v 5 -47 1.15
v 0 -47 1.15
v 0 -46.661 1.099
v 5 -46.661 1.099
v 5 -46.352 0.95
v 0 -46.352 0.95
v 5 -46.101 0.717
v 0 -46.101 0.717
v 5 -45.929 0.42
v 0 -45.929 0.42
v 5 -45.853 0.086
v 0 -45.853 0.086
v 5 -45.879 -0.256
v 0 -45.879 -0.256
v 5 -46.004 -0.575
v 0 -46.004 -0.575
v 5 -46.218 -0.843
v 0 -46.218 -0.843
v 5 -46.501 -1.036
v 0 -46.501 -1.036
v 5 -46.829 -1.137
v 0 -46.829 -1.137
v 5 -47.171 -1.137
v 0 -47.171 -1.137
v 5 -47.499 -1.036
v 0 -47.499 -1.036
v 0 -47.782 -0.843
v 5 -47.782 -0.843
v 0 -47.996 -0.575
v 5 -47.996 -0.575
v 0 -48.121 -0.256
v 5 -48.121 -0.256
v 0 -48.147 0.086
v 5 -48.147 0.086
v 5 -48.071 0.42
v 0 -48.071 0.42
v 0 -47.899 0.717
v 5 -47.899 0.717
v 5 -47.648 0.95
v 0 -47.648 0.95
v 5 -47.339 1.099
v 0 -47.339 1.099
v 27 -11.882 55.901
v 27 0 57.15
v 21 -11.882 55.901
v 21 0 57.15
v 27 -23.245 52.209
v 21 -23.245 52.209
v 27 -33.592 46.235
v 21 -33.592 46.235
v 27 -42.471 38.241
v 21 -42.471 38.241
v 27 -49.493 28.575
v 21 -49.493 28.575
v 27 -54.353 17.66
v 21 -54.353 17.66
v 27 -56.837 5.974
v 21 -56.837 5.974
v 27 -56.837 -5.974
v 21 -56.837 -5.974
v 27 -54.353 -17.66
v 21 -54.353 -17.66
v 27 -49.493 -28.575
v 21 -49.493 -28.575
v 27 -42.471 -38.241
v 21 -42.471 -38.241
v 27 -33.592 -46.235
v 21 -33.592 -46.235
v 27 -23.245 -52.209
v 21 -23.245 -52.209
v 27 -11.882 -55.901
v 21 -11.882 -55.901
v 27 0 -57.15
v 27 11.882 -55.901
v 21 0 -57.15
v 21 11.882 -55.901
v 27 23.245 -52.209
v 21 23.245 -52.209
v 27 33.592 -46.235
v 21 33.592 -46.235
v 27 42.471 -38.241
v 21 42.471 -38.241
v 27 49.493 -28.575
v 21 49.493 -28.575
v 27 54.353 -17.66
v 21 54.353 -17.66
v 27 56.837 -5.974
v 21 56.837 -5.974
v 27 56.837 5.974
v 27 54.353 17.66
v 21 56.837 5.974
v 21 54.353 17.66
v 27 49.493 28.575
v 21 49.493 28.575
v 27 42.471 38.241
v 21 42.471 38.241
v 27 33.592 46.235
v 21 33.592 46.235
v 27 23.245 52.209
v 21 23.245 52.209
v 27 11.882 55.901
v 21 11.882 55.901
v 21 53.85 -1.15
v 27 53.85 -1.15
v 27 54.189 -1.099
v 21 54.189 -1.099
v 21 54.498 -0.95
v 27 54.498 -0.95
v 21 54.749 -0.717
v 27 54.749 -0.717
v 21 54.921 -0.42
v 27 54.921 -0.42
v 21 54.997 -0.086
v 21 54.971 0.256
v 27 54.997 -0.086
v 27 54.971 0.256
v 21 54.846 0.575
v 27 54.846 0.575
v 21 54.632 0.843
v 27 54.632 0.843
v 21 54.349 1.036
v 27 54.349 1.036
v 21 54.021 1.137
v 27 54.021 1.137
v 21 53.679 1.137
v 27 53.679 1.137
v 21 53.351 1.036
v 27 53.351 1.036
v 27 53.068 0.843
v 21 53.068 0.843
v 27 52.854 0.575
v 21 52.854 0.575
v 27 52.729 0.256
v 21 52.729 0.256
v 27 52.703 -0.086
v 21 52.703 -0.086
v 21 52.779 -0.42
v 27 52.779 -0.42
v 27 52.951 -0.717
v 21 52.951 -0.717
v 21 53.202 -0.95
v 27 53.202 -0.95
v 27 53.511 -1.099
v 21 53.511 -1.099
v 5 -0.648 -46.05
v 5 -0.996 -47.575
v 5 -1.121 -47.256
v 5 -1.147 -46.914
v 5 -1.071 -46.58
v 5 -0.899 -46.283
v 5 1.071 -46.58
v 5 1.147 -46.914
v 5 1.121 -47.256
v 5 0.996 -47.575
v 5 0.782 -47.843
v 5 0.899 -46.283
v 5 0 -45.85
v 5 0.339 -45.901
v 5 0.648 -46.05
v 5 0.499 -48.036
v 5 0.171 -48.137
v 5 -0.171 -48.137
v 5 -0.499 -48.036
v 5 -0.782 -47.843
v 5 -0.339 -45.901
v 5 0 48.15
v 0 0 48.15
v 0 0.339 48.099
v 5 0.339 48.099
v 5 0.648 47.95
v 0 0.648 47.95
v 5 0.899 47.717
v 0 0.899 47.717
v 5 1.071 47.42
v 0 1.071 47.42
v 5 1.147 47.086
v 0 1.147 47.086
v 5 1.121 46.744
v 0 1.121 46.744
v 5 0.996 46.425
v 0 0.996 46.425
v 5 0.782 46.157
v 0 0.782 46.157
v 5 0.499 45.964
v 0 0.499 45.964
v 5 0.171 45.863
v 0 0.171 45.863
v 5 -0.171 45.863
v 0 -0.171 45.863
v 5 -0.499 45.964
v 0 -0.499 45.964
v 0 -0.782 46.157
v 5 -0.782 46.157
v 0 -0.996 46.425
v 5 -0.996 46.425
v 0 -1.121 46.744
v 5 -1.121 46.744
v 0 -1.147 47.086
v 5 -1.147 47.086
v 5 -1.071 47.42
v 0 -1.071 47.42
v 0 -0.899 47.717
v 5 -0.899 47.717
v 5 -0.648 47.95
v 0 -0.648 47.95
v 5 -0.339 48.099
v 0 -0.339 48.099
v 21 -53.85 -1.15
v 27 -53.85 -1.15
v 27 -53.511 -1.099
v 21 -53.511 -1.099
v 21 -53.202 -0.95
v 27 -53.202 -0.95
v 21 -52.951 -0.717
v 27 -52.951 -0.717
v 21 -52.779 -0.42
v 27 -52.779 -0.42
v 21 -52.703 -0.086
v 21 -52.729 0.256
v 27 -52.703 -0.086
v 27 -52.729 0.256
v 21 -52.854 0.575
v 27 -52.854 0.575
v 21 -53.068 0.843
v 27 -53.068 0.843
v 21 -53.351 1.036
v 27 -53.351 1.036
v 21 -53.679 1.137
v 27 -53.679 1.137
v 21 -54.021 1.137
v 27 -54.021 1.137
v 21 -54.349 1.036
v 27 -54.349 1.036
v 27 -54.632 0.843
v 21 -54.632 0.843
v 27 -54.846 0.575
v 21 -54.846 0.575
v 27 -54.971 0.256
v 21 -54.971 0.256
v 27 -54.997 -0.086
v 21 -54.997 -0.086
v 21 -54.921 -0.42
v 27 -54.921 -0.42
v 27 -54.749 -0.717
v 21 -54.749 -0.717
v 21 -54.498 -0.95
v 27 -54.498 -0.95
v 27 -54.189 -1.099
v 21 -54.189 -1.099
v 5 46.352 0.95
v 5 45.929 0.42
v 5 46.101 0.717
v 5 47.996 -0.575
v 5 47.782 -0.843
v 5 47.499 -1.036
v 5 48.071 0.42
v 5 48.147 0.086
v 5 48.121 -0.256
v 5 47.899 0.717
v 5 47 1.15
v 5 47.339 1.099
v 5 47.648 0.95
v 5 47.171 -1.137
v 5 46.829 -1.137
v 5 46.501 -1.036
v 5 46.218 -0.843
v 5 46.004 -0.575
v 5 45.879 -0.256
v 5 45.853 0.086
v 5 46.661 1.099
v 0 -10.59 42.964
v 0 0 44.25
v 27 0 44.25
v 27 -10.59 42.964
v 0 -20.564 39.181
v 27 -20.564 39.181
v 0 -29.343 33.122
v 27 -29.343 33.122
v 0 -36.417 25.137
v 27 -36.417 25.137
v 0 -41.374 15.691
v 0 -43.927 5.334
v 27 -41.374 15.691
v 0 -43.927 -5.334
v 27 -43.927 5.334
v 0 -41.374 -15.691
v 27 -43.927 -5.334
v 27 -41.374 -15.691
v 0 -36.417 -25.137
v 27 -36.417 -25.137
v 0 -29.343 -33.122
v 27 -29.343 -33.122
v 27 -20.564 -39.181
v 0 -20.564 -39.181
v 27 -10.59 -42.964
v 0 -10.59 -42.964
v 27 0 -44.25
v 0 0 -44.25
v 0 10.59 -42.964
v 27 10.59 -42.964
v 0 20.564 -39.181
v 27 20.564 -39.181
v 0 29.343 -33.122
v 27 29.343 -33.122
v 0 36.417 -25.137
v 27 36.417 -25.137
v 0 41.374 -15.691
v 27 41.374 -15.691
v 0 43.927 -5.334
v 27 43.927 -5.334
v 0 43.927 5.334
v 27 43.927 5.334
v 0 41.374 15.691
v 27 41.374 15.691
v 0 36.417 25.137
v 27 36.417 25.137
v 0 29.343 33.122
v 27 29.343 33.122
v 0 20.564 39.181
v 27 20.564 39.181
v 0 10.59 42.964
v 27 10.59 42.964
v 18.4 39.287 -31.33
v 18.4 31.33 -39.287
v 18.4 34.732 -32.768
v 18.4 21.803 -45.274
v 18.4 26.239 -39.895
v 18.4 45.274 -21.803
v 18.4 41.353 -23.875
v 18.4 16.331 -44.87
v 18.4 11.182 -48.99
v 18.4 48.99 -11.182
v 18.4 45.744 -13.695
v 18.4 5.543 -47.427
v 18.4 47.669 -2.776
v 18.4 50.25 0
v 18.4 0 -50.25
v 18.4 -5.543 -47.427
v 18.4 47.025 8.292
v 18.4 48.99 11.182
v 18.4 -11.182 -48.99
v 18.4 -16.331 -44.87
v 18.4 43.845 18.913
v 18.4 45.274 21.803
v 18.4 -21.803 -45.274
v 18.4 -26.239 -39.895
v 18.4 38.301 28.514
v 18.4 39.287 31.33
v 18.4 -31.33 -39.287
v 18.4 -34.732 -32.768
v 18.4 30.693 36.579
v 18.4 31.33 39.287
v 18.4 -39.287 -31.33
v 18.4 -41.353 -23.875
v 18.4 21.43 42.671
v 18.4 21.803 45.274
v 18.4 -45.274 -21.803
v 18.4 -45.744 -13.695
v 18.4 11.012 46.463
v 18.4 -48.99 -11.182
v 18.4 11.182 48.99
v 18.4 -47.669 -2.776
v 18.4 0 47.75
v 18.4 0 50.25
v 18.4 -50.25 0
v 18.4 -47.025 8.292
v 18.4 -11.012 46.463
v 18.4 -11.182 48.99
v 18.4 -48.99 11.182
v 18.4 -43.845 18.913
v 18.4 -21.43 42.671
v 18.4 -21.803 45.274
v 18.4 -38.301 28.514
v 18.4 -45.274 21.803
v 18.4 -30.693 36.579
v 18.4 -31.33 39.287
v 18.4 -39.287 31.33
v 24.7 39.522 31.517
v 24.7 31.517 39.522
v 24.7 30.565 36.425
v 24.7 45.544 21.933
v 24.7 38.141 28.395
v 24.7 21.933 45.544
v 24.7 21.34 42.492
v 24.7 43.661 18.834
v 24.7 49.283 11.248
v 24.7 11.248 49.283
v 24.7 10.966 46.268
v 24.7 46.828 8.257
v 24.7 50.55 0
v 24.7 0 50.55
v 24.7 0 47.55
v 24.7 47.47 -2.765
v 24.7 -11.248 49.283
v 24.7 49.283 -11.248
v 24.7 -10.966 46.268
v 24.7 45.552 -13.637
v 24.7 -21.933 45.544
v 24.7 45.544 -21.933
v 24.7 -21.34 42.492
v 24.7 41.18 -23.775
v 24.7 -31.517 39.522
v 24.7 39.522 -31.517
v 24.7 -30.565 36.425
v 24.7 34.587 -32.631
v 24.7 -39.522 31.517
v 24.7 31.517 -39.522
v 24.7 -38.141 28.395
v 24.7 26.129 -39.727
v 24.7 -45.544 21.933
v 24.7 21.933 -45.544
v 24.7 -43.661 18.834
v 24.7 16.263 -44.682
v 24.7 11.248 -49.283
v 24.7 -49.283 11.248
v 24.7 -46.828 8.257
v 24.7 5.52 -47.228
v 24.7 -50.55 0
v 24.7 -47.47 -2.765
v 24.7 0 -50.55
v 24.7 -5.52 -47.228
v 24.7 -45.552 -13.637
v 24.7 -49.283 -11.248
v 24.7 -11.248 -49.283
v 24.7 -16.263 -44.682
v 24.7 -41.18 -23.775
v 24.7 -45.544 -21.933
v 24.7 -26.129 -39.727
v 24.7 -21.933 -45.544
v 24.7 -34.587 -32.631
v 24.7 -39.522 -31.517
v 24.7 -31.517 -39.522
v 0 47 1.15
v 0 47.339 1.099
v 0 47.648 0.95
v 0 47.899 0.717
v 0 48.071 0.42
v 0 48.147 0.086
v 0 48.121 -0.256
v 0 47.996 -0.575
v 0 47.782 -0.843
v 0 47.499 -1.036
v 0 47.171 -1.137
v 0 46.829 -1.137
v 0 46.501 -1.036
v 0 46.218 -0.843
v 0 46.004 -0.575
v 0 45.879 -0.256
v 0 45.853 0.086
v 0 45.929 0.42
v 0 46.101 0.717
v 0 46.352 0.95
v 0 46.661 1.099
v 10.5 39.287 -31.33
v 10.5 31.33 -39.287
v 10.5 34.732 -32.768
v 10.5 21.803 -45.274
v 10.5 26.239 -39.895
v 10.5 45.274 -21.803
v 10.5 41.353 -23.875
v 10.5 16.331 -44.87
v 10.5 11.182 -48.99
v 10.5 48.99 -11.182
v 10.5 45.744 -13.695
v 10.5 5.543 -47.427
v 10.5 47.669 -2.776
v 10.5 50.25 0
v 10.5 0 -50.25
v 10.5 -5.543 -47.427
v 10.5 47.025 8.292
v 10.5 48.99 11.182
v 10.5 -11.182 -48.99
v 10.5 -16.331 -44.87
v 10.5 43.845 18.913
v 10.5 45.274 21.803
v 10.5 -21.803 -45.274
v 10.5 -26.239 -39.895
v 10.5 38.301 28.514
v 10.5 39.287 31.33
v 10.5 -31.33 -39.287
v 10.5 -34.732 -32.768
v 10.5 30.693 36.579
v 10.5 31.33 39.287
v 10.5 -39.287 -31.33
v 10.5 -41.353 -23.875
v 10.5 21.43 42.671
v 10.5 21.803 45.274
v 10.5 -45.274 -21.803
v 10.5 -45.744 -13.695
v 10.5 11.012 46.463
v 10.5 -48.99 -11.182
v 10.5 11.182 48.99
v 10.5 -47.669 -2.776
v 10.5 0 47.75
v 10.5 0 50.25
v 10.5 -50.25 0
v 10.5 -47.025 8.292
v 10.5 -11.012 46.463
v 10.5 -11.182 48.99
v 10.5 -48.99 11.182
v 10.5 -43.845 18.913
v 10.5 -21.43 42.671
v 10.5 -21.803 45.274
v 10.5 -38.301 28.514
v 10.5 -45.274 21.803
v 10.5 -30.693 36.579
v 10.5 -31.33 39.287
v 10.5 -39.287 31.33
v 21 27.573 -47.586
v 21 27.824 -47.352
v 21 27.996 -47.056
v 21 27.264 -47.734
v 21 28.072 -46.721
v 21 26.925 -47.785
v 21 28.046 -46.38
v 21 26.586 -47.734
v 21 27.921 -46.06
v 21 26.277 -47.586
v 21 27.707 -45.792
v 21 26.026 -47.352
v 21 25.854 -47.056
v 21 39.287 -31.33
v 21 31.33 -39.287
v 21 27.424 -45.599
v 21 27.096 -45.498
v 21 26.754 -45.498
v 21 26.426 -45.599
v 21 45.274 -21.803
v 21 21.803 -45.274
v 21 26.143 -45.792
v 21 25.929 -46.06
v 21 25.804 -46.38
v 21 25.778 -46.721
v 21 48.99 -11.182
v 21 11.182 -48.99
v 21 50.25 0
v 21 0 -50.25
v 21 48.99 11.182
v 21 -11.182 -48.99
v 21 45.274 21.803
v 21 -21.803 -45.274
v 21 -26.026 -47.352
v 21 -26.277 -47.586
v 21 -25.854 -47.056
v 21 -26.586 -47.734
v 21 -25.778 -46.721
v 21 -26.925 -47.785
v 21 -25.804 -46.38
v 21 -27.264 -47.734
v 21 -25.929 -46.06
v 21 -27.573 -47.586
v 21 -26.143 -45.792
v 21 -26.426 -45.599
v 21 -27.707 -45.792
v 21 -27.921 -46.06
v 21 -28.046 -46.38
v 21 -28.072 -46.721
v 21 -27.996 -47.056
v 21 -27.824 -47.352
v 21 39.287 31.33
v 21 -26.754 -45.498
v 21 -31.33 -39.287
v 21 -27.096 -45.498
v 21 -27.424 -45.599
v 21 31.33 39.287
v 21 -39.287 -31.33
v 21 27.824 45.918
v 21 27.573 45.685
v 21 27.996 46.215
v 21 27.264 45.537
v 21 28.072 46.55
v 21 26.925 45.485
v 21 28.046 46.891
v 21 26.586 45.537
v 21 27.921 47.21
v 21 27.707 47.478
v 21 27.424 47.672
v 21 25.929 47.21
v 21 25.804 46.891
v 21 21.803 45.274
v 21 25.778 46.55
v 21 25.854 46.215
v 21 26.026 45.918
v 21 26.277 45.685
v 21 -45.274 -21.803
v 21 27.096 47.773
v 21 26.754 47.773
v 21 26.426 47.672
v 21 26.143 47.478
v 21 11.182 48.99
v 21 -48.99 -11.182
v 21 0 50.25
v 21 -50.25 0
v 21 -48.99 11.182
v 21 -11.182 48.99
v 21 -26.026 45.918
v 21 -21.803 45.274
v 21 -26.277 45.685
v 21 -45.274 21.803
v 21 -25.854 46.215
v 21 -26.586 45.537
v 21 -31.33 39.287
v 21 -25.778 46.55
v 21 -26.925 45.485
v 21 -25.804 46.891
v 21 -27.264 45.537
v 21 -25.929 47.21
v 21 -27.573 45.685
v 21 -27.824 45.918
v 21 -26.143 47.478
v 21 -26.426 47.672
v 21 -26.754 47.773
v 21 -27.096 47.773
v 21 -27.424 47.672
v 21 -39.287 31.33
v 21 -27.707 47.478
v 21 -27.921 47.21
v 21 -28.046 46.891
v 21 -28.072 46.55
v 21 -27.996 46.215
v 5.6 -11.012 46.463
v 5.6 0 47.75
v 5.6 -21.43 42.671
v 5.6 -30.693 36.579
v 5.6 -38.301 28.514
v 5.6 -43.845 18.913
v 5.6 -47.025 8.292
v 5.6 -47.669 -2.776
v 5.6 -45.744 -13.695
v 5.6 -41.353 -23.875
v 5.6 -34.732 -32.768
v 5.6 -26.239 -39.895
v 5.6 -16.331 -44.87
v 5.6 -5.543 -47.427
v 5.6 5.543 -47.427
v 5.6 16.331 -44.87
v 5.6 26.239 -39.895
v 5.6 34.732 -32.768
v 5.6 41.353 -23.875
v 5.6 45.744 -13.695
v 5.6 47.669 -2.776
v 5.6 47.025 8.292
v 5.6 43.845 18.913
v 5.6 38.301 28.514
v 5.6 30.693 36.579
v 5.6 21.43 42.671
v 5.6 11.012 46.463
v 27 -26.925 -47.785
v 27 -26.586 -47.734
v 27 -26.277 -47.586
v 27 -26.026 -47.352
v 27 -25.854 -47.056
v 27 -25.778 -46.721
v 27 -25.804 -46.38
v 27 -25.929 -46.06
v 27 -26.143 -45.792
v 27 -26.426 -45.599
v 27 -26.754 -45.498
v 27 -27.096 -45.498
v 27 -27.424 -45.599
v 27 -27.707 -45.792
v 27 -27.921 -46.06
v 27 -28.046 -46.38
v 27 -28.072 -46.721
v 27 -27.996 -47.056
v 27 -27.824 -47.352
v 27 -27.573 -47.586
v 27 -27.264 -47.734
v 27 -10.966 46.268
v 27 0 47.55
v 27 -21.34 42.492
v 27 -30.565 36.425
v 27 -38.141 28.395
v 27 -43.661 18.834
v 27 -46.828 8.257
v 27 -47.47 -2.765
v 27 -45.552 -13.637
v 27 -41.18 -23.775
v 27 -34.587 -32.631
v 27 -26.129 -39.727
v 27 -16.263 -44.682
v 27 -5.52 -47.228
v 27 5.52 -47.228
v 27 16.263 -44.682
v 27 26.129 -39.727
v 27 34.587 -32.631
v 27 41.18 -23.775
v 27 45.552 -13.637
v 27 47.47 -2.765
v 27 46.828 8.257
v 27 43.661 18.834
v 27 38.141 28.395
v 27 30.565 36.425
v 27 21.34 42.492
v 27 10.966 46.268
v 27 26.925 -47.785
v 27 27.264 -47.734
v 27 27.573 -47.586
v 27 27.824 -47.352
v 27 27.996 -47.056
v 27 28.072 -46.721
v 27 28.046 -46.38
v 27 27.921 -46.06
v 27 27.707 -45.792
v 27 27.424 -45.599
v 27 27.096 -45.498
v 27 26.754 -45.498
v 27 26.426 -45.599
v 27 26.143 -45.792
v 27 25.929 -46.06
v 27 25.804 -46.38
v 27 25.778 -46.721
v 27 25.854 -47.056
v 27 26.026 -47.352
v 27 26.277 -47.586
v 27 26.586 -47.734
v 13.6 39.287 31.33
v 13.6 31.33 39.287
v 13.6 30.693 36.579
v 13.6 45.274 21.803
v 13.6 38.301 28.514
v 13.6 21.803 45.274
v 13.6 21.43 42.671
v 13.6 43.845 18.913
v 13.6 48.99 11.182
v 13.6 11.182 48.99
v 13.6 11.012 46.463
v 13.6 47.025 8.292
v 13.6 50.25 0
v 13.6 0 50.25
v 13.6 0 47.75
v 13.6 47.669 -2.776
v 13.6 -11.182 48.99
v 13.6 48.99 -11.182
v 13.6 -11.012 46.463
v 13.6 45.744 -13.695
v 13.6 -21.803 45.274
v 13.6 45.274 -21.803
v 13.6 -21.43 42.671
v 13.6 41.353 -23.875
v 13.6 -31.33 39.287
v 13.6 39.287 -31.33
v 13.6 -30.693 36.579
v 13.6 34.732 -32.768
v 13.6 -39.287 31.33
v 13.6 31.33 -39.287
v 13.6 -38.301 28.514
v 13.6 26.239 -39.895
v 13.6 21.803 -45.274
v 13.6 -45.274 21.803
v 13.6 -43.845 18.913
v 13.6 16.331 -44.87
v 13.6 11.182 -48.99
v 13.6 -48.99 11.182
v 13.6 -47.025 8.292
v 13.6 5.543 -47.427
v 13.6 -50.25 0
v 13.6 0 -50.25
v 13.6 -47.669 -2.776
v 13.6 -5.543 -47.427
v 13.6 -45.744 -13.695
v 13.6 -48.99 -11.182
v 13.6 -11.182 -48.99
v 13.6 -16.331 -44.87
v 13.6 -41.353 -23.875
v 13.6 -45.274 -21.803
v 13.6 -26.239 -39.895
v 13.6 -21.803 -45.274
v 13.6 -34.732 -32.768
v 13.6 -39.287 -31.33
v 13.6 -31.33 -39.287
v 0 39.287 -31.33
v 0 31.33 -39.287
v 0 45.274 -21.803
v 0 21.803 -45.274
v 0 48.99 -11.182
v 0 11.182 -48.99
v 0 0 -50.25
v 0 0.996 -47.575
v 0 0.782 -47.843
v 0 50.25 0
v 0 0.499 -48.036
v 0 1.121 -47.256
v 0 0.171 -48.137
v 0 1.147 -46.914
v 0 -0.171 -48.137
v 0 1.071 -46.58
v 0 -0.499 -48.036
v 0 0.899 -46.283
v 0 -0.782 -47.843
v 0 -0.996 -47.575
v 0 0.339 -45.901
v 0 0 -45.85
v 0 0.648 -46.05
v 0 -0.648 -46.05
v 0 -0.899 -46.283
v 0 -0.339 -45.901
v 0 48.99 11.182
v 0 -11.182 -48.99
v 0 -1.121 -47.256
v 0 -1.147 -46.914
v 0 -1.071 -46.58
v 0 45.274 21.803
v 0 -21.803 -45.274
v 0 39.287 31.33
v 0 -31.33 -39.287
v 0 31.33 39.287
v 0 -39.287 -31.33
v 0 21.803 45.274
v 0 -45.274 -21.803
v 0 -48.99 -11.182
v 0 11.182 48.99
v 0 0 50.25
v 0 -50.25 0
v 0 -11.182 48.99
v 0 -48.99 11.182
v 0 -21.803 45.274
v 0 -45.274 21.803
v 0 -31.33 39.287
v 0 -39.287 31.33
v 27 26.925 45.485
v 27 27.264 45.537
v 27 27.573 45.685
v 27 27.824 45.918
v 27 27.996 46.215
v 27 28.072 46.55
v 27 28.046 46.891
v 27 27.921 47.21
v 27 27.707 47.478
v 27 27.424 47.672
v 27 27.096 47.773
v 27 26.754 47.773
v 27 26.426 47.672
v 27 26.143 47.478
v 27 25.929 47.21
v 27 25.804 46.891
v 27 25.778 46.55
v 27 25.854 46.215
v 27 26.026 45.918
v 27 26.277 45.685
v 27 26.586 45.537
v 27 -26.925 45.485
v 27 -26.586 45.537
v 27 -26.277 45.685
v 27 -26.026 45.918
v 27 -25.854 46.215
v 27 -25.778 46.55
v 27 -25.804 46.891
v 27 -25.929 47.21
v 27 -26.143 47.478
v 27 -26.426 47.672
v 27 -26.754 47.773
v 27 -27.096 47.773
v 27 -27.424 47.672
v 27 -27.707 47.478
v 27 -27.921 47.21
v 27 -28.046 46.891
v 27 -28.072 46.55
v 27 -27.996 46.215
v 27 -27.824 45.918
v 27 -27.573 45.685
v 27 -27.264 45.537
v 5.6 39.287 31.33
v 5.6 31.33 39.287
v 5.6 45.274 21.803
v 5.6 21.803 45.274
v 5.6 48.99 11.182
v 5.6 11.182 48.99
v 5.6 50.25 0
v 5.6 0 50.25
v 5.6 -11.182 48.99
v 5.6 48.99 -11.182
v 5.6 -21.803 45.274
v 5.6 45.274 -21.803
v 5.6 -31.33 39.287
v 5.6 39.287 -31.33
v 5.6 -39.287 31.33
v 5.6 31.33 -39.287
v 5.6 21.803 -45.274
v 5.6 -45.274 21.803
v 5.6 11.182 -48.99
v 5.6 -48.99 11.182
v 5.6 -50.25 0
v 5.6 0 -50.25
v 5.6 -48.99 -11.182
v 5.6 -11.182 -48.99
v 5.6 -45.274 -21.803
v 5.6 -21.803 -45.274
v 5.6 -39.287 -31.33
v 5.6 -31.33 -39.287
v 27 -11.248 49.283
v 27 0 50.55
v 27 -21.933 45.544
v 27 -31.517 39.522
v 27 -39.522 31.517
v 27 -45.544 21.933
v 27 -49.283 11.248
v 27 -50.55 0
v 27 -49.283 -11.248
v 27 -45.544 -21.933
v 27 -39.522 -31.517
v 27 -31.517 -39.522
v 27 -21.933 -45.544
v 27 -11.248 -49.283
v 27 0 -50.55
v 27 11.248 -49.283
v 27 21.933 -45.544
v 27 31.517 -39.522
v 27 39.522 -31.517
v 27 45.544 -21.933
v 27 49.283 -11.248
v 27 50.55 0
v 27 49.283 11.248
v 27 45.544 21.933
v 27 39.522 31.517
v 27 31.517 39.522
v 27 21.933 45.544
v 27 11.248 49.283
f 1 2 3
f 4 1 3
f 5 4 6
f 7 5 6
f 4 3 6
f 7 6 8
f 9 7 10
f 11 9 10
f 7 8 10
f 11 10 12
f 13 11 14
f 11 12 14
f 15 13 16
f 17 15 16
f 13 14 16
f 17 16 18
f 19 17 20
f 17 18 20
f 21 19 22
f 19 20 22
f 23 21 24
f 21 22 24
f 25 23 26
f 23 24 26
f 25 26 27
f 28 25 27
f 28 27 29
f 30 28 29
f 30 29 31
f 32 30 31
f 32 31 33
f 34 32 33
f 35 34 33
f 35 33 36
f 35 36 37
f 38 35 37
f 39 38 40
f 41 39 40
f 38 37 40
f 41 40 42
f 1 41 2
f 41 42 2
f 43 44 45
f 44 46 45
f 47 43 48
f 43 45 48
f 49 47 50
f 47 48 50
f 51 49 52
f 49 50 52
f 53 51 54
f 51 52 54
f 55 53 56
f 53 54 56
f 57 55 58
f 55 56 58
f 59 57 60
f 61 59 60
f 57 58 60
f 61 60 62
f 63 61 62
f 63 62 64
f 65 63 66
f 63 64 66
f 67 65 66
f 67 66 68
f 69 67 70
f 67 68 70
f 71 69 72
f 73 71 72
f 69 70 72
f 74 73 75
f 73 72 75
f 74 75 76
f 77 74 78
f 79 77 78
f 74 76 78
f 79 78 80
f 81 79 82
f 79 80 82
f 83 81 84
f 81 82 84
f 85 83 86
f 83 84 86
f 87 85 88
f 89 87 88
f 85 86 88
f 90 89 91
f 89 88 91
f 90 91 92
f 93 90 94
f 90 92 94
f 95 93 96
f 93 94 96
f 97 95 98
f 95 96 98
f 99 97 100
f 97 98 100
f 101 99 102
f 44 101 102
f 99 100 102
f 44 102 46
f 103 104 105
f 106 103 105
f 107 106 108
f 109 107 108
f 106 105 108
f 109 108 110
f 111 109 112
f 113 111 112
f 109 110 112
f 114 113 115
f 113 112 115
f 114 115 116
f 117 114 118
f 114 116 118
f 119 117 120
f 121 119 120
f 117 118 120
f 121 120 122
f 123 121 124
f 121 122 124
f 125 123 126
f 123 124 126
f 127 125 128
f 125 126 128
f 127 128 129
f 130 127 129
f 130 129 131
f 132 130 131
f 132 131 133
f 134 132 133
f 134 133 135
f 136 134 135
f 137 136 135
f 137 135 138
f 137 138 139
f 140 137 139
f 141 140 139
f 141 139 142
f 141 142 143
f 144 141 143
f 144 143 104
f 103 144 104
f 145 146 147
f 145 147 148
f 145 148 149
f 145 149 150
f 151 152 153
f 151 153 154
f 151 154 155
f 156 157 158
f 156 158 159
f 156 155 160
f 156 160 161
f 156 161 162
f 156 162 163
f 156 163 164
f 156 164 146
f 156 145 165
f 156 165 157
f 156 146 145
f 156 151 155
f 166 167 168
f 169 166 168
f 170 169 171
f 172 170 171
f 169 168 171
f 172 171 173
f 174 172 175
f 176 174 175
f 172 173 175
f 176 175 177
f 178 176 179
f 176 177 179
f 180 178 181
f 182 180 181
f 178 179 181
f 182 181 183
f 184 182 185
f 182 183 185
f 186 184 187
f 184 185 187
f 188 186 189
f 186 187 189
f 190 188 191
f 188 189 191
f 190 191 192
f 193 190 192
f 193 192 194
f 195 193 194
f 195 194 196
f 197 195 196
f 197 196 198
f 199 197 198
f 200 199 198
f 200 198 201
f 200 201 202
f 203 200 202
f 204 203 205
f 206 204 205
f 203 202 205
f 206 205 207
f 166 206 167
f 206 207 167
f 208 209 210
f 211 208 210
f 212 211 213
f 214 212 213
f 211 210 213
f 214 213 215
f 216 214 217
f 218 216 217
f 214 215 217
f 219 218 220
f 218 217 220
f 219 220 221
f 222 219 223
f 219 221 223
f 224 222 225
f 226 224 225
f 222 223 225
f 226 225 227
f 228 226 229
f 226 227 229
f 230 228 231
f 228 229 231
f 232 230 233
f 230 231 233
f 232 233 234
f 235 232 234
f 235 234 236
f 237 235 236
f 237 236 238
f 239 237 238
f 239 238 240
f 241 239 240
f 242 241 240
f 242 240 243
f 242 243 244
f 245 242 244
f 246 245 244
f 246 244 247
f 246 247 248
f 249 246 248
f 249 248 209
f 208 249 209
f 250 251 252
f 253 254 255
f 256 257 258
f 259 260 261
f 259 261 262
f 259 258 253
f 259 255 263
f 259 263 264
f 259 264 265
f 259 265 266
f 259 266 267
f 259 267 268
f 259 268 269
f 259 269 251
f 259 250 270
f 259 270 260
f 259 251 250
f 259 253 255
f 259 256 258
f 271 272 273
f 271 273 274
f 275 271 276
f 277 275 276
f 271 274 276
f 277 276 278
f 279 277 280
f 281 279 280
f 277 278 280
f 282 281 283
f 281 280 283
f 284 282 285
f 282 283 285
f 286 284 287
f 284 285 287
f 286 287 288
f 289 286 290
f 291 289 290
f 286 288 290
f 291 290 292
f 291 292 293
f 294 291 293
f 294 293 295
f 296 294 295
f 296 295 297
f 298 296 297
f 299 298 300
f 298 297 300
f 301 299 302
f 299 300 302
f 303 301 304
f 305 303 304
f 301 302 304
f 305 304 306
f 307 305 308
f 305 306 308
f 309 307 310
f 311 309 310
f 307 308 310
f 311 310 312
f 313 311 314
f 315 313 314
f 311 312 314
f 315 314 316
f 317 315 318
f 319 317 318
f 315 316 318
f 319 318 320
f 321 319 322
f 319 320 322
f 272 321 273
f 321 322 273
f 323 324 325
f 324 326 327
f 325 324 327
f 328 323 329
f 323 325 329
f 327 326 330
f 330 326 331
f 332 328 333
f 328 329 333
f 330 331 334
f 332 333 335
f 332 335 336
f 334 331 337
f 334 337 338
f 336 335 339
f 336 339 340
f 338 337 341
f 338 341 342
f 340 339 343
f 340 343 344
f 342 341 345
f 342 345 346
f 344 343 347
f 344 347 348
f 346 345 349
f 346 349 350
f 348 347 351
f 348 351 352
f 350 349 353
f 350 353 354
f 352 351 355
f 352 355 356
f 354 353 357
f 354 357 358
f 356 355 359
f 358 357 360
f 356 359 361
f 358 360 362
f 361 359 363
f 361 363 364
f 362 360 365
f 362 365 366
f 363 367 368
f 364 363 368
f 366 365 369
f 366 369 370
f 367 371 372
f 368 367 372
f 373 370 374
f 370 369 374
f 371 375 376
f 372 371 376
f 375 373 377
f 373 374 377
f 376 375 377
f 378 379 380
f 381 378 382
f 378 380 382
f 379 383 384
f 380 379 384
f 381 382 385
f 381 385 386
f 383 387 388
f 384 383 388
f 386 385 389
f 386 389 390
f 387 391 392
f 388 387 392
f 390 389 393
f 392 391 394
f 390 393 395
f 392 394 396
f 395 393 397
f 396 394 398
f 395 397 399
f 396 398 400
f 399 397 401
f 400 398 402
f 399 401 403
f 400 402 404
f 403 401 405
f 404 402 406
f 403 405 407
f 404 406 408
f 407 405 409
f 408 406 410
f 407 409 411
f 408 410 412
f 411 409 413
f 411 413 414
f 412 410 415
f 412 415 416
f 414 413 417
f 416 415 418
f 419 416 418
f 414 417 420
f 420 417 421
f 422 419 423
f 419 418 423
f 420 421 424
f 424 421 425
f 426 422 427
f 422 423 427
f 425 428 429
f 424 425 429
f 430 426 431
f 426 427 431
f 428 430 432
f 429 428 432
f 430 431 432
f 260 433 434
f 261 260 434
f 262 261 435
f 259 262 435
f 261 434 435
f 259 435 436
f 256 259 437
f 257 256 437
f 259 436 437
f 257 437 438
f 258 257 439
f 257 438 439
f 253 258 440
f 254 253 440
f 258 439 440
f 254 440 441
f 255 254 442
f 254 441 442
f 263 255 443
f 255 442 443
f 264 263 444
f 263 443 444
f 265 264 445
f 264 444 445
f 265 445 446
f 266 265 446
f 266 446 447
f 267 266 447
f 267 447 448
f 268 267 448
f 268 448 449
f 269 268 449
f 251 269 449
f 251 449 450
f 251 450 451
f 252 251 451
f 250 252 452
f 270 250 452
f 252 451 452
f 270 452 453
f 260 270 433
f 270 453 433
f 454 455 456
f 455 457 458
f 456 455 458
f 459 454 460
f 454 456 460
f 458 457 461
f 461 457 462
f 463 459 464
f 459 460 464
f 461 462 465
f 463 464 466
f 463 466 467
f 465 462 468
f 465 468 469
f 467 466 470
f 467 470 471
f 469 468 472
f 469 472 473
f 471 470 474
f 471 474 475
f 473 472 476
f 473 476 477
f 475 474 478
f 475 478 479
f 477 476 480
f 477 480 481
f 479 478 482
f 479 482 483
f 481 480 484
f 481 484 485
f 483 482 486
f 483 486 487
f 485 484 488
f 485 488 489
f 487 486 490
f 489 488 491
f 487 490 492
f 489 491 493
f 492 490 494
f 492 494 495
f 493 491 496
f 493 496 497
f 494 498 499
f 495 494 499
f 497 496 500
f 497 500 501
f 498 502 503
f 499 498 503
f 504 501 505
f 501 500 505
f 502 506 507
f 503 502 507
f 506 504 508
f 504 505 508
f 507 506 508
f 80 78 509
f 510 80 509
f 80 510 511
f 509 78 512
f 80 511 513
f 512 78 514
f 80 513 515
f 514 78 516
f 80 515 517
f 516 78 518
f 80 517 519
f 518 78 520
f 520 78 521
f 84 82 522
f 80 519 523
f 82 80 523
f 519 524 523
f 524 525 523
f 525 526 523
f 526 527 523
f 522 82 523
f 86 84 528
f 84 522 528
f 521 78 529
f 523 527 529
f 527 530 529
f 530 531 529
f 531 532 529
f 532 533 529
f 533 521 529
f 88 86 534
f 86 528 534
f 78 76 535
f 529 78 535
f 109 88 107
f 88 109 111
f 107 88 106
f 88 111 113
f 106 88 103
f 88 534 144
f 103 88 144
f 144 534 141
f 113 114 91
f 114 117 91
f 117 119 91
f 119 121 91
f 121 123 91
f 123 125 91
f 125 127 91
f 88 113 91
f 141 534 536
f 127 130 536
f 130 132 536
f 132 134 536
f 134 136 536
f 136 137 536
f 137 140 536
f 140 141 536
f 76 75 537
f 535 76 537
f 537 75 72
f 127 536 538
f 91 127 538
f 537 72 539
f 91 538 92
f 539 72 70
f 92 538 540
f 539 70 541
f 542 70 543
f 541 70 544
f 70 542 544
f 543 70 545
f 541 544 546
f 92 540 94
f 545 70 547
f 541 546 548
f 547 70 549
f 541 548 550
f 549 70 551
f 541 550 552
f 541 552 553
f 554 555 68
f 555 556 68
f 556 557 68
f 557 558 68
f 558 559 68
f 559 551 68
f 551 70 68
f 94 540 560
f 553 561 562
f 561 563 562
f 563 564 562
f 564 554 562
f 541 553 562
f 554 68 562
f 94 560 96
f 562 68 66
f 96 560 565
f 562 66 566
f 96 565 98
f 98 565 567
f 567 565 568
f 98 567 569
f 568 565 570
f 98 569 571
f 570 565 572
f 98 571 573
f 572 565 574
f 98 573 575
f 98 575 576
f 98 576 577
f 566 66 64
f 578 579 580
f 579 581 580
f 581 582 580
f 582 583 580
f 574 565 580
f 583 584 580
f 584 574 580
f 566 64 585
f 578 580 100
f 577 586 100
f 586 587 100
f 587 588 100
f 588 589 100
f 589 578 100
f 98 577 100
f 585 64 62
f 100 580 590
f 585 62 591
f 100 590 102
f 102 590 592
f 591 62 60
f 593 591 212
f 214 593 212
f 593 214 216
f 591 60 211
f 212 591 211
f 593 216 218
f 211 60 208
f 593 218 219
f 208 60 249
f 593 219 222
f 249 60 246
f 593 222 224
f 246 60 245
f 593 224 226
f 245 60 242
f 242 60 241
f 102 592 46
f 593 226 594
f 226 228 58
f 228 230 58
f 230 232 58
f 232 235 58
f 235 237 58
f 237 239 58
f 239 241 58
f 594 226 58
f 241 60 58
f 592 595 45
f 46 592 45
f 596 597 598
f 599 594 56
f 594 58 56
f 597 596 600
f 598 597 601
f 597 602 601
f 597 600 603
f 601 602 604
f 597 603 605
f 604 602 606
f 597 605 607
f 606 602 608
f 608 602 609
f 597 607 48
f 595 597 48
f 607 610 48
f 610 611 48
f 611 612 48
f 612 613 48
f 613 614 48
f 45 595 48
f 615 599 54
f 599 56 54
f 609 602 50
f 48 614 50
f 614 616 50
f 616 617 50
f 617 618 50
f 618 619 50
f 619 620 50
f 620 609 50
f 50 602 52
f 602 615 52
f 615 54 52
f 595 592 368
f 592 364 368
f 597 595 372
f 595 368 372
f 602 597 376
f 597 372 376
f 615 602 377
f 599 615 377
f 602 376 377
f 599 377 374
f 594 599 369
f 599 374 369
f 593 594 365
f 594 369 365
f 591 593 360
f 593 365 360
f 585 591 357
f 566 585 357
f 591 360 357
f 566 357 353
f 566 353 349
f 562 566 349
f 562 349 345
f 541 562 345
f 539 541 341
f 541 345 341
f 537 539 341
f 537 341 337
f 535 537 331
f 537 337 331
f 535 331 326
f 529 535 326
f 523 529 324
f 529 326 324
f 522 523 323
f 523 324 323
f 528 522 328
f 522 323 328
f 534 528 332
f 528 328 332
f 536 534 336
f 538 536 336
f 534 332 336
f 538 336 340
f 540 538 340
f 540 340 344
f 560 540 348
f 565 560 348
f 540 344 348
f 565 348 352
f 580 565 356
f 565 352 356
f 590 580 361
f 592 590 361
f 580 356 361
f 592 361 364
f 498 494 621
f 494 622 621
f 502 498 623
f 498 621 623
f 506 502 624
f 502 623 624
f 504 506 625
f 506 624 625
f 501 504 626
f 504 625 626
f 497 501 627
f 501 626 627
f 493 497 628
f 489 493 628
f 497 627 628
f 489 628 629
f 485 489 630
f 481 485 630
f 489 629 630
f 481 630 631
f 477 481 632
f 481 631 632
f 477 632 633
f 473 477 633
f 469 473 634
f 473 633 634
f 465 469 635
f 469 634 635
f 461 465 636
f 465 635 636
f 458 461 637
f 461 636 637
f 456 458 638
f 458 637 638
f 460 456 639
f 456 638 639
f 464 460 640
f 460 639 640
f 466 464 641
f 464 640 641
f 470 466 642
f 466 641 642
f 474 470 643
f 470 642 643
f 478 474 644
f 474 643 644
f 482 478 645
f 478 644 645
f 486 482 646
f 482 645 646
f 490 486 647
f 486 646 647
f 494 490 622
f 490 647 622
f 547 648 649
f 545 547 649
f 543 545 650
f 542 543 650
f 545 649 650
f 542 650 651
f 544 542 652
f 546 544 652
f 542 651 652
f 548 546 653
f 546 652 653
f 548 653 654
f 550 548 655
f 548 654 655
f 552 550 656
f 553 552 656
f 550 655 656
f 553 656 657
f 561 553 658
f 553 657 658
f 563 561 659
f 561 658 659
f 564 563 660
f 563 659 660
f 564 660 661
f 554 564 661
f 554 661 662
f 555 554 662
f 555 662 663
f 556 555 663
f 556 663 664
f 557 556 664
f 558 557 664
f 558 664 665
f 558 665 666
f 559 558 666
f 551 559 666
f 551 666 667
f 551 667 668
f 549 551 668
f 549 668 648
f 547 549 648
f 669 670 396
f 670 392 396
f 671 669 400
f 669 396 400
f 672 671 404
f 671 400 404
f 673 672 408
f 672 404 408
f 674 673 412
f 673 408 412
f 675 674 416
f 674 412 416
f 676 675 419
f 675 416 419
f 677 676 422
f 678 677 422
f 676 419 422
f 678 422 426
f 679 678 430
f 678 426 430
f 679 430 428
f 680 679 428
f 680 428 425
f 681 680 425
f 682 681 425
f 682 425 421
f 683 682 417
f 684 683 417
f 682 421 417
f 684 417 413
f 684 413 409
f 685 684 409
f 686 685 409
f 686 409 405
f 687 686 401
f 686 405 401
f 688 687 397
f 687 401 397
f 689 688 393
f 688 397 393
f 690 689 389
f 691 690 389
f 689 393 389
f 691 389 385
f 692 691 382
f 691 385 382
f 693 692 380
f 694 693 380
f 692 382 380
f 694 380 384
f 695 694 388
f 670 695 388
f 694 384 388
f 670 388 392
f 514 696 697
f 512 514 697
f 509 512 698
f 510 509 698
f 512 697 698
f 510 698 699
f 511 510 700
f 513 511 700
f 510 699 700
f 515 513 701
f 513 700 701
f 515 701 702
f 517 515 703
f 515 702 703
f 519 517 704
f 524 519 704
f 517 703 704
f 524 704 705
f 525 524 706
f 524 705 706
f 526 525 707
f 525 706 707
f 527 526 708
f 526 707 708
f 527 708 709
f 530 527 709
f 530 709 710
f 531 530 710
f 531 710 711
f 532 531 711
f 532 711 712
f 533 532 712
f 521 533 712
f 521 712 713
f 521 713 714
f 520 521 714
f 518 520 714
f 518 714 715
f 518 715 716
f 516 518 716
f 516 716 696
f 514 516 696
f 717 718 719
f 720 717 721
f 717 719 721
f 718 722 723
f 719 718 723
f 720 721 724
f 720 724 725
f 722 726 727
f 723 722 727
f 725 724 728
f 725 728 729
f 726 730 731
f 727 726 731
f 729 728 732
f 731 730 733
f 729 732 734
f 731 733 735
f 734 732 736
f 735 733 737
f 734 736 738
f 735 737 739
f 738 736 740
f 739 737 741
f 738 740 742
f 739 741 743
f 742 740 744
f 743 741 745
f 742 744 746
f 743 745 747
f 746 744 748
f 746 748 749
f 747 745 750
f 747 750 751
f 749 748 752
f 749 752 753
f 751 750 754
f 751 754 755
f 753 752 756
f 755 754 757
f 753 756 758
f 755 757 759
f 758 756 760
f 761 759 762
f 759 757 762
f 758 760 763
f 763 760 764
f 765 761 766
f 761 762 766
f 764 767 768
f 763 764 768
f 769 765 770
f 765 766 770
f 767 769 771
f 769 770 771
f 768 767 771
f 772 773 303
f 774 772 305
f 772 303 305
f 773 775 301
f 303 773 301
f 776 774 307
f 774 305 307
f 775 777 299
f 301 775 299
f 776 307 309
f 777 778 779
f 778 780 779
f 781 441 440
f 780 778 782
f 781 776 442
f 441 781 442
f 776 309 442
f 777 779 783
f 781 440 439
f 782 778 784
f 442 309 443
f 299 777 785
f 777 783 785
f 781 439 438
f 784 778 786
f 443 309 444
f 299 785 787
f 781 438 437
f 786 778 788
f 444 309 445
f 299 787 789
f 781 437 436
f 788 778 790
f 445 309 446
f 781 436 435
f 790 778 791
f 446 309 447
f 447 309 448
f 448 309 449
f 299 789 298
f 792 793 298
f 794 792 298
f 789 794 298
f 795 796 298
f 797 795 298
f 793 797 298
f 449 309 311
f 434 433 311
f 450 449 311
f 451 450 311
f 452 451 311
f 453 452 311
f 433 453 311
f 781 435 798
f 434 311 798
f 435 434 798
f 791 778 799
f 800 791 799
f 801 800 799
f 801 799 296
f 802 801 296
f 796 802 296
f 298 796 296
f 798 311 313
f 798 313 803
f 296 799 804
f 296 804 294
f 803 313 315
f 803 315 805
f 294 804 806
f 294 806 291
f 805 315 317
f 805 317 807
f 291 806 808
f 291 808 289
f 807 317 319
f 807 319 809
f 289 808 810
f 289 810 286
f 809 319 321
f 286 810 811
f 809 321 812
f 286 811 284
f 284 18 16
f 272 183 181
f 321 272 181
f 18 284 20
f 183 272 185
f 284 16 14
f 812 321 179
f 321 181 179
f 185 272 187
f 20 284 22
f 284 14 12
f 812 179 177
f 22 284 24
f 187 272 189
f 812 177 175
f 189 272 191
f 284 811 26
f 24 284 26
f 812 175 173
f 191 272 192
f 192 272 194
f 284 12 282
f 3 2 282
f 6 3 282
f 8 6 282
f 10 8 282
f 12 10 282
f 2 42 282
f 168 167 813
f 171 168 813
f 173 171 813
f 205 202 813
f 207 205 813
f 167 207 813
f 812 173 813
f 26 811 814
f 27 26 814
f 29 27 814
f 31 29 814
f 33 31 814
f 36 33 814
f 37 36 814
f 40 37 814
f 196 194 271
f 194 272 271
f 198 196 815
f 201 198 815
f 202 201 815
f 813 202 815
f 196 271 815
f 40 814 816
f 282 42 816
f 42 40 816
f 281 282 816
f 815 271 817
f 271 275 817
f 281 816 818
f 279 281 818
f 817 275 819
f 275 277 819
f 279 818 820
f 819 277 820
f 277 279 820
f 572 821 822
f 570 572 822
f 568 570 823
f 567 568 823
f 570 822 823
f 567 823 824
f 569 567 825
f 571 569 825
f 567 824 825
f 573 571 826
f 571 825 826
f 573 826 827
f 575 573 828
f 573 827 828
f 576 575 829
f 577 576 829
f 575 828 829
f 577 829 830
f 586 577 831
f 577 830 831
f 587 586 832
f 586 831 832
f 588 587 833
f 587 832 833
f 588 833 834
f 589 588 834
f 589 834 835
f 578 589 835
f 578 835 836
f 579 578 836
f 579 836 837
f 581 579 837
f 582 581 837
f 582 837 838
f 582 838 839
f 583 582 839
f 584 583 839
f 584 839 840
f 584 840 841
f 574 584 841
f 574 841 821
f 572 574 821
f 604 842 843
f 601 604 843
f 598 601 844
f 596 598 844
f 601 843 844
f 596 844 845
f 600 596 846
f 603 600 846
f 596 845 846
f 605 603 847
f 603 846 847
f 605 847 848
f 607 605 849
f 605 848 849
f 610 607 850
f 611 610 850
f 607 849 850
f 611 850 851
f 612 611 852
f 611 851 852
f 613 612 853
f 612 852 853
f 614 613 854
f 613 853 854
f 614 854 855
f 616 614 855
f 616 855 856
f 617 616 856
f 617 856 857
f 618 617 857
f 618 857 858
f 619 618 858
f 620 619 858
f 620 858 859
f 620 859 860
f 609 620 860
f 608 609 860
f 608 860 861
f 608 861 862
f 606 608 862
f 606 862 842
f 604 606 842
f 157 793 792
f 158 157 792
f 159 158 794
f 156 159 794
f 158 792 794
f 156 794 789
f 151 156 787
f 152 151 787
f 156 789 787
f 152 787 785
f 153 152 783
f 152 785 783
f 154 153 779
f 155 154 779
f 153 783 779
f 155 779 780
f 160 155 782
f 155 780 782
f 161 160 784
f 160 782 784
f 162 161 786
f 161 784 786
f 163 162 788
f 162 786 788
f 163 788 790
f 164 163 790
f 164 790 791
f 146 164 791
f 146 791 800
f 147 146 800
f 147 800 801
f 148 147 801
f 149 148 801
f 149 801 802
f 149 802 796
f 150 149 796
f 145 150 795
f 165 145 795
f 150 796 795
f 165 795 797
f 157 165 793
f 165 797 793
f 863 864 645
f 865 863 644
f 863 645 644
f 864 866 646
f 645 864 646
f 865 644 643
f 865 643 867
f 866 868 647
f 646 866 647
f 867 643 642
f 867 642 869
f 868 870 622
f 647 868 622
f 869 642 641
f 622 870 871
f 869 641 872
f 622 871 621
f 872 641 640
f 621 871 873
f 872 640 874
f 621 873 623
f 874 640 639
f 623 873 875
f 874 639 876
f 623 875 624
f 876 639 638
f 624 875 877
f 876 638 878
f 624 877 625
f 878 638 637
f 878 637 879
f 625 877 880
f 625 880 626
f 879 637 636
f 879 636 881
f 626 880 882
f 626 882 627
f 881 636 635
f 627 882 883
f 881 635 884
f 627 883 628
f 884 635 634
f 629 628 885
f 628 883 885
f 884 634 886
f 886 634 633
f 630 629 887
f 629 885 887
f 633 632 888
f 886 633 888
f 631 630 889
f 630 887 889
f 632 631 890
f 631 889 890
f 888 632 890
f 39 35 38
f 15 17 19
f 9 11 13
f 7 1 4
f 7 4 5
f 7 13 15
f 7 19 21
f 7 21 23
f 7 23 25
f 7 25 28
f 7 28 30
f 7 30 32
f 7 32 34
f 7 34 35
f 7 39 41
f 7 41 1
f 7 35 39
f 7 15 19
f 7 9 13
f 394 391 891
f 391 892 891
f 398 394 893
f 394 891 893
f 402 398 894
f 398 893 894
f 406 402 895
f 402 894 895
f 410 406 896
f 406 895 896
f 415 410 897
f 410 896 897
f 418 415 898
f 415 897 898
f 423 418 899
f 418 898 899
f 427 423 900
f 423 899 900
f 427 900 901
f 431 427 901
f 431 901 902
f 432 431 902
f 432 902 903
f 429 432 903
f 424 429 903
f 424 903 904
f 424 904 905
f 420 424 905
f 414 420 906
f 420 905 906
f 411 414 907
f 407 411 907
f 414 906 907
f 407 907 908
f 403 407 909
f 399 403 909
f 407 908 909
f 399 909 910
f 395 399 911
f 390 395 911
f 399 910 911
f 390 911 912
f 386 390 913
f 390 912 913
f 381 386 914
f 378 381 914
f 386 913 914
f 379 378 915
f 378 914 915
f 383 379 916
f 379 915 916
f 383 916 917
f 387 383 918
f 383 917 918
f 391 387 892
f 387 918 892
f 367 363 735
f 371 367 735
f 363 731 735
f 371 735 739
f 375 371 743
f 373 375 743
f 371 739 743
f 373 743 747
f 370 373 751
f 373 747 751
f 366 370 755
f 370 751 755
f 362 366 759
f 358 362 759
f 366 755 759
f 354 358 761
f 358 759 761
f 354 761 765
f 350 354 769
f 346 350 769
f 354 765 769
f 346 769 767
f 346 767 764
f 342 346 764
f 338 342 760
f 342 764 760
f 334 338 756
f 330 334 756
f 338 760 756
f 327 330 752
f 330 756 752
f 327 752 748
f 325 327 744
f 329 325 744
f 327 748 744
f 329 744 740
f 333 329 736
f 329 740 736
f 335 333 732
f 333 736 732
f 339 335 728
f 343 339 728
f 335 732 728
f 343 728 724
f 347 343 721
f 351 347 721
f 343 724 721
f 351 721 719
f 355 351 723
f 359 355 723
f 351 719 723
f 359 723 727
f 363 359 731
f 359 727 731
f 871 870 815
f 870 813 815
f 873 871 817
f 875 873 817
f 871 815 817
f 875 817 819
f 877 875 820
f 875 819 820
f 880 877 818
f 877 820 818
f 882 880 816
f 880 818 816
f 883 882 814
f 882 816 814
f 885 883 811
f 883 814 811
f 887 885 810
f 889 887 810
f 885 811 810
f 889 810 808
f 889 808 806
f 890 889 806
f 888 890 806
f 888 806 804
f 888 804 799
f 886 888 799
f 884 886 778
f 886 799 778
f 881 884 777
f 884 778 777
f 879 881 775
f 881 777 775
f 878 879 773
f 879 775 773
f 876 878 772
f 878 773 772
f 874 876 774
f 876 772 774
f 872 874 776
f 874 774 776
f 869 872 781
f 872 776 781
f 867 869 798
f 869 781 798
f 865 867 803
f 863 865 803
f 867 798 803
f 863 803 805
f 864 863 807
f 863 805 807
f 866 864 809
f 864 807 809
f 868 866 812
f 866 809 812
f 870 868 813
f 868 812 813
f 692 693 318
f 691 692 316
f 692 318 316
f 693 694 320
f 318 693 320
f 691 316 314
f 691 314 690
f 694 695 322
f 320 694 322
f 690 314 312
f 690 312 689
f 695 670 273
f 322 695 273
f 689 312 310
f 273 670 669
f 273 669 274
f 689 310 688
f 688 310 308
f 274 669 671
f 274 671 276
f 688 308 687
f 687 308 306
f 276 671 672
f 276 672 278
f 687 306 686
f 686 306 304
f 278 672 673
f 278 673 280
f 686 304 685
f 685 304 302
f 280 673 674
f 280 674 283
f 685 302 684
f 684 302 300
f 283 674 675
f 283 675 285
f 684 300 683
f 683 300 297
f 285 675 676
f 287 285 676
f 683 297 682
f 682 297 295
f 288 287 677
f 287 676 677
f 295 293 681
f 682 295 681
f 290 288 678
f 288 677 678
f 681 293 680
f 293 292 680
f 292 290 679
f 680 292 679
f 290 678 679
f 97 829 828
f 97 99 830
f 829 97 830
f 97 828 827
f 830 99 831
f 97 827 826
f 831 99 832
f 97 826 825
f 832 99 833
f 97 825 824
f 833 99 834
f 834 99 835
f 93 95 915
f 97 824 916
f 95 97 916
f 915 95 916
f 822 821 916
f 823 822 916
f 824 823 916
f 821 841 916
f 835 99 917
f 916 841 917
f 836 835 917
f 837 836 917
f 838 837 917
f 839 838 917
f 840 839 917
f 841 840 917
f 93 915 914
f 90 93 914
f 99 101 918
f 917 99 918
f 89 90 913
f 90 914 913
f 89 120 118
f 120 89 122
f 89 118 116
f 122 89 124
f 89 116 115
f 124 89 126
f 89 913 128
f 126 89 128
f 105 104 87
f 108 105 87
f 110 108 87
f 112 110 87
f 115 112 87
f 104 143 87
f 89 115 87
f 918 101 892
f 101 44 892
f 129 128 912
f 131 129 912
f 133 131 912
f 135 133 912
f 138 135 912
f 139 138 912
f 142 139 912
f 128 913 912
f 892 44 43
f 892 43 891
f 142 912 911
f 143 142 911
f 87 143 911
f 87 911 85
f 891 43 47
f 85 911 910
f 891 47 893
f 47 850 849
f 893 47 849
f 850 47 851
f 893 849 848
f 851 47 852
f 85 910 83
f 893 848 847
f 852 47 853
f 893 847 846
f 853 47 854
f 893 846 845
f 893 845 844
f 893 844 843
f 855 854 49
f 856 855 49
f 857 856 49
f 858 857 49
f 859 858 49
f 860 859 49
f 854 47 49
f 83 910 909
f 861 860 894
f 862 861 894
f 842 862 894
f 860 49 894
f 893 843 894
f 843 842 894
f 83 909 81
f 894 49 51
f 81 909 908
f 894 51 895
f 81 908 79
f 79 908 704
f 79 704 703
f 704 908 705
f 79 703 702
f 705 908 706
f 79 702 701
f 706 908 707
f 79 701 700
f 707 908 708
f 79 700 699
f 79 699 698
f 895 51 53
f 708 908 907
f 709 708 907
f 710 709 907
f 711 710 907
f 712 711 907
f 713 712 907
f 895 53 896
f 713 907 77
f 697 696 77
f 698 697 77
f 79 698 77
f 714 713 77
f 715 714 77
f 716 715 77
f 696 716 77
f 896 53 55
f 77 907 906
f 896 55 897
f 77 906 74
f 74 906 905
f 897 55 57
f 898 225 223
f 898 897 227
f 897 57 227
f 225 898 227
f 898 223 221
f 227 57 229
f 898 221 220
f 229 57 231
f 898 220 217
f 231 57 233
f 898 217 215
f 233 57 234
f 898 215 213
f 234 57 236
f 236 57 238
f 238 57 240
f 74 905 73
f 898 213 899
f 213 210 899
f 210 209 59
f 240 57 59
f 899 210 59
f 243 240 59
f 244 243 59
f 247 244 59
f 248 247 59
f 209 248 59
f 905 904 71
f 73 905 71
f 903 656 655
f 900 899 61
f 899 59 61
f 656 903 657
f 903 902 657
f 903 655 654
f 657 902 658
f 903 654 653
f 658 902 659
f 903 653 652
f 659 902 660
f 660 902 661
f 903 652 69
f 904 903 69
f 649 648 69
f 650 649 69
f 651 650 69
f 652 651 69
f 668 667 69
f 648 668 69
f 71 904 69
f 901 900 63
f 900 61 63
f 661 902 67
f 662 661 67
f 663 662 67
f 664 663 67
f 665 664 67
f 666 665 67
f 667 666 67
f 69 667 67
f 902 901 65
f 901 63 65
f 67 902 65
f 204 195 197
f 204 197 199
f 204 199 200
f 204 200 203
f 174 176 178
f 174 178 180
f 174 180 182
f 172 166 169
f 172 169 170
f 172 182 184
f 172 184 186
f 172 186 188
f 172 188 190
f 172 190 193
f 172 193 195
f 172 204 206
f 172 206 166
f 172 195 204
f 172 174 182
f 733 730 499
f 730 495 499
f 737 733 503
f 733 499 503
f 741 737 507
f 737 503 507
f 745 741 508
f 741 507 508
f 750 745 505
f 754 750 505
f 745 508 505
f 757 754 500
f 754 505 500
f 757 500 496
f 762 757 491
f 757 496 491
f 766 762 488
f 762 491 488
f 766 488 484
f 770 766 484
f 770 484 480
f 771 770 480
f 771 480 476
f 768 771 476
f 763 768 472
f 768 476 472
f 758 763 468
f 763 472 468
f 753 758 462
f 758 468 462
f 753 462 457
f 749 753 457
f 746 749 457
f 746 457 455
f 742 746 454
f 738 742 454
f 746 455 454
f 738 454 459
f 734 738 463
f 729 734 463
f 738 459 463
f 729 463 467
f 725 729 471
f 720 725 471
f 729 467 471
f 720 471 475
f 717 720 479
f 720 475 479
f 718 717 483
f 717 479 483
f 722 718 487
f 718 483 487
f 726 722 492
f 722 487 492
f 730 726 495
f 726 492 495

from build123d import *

# Parameters (mm, degrees)
ESQUISSE2_R             = 1.15
ENL_V_MAT_EXTRU_1_DEPTH = 86.212939158
ESQUISSE3_R             = 1.15
ENL_V_MAT_EXTRU_2_DEPTH = 5


with BuildPart() as part:
    # Esquisse1 → Révolution1 (revolve)
    with BuildSketch(Plane.XY, mode=Mode.PRIVATE) as r_volution1_sk:
        Polygon((0, 44.25), (27, 44.25), (27, 47.55), (24.7, 47.55), (24.7, 50.55), (27, 50.55), (27, 57.15), (21, 57.15), (21, 50.25), (18.4, 50.25), (18.4, 47.75), (13.6, 47.75), (13.6, 50.25), (10.5, 50.25), (10.5, 47.75), (5.6, 47.75), (5.6, 50.25), (0, 50.25), align=None)
    revolve(r_volution1_sk.sketch.rotate(Axis((0, 0, 0), (1, 0, 0)), 90), axis=Axis((0, 0, 0), (1, 0, 0)))

    # Esquisse2 → Enlèv. mat.-Extru.1 (cut, through all)
    with BuildSketch(Plane(origin=(27, 0, 0), x_dir=(0, 0, -1), z_dir=(1, 0, 0))):
        with Locations((0, 53.85)):
            Circle(ESQUISSE2_R)
        with Locations((46.635467994, 26.925)):
            Circle(ESQUISSE2_R)
        with Locations((46.635467994, -26.925)):
            Circle(ESQUISSE2_R)
        with Locations((0, -53.85)):
            Circle(ESQUISSE2_R)
        with Locations((-46.635467994, -26.925)):
            Circle(ESQUISSE2_R)
        with Locations((-46.635467994, 26.925)):
            Circle(ESQUISSE2_R)
    extrude(amount=-ENL_V_MAT_EXTRU_1_DEPTH, mode=Mode.SUBTRACT)

    # Esquisse3 → Enlèv. mat.-Extru.2 (cut)
    with BuildSketch(Plane.ZY):
        with Locations((0, -47)):
            Circle(ESQUISSE3_R)
        with Locations((-47, 0)):
            Circle(ESQUISSE3_R)
        with Locations((0, 47)):
            Circle(ESQUISSE3_R)
        with Locations((47, 0)):
            Circle(ESQUISSE3_R)
    extrude(amount=-ENL_V_MAT_EXTRU_2_DEPTH, mode=Mode.SUBTRACT)


solid = part.part
